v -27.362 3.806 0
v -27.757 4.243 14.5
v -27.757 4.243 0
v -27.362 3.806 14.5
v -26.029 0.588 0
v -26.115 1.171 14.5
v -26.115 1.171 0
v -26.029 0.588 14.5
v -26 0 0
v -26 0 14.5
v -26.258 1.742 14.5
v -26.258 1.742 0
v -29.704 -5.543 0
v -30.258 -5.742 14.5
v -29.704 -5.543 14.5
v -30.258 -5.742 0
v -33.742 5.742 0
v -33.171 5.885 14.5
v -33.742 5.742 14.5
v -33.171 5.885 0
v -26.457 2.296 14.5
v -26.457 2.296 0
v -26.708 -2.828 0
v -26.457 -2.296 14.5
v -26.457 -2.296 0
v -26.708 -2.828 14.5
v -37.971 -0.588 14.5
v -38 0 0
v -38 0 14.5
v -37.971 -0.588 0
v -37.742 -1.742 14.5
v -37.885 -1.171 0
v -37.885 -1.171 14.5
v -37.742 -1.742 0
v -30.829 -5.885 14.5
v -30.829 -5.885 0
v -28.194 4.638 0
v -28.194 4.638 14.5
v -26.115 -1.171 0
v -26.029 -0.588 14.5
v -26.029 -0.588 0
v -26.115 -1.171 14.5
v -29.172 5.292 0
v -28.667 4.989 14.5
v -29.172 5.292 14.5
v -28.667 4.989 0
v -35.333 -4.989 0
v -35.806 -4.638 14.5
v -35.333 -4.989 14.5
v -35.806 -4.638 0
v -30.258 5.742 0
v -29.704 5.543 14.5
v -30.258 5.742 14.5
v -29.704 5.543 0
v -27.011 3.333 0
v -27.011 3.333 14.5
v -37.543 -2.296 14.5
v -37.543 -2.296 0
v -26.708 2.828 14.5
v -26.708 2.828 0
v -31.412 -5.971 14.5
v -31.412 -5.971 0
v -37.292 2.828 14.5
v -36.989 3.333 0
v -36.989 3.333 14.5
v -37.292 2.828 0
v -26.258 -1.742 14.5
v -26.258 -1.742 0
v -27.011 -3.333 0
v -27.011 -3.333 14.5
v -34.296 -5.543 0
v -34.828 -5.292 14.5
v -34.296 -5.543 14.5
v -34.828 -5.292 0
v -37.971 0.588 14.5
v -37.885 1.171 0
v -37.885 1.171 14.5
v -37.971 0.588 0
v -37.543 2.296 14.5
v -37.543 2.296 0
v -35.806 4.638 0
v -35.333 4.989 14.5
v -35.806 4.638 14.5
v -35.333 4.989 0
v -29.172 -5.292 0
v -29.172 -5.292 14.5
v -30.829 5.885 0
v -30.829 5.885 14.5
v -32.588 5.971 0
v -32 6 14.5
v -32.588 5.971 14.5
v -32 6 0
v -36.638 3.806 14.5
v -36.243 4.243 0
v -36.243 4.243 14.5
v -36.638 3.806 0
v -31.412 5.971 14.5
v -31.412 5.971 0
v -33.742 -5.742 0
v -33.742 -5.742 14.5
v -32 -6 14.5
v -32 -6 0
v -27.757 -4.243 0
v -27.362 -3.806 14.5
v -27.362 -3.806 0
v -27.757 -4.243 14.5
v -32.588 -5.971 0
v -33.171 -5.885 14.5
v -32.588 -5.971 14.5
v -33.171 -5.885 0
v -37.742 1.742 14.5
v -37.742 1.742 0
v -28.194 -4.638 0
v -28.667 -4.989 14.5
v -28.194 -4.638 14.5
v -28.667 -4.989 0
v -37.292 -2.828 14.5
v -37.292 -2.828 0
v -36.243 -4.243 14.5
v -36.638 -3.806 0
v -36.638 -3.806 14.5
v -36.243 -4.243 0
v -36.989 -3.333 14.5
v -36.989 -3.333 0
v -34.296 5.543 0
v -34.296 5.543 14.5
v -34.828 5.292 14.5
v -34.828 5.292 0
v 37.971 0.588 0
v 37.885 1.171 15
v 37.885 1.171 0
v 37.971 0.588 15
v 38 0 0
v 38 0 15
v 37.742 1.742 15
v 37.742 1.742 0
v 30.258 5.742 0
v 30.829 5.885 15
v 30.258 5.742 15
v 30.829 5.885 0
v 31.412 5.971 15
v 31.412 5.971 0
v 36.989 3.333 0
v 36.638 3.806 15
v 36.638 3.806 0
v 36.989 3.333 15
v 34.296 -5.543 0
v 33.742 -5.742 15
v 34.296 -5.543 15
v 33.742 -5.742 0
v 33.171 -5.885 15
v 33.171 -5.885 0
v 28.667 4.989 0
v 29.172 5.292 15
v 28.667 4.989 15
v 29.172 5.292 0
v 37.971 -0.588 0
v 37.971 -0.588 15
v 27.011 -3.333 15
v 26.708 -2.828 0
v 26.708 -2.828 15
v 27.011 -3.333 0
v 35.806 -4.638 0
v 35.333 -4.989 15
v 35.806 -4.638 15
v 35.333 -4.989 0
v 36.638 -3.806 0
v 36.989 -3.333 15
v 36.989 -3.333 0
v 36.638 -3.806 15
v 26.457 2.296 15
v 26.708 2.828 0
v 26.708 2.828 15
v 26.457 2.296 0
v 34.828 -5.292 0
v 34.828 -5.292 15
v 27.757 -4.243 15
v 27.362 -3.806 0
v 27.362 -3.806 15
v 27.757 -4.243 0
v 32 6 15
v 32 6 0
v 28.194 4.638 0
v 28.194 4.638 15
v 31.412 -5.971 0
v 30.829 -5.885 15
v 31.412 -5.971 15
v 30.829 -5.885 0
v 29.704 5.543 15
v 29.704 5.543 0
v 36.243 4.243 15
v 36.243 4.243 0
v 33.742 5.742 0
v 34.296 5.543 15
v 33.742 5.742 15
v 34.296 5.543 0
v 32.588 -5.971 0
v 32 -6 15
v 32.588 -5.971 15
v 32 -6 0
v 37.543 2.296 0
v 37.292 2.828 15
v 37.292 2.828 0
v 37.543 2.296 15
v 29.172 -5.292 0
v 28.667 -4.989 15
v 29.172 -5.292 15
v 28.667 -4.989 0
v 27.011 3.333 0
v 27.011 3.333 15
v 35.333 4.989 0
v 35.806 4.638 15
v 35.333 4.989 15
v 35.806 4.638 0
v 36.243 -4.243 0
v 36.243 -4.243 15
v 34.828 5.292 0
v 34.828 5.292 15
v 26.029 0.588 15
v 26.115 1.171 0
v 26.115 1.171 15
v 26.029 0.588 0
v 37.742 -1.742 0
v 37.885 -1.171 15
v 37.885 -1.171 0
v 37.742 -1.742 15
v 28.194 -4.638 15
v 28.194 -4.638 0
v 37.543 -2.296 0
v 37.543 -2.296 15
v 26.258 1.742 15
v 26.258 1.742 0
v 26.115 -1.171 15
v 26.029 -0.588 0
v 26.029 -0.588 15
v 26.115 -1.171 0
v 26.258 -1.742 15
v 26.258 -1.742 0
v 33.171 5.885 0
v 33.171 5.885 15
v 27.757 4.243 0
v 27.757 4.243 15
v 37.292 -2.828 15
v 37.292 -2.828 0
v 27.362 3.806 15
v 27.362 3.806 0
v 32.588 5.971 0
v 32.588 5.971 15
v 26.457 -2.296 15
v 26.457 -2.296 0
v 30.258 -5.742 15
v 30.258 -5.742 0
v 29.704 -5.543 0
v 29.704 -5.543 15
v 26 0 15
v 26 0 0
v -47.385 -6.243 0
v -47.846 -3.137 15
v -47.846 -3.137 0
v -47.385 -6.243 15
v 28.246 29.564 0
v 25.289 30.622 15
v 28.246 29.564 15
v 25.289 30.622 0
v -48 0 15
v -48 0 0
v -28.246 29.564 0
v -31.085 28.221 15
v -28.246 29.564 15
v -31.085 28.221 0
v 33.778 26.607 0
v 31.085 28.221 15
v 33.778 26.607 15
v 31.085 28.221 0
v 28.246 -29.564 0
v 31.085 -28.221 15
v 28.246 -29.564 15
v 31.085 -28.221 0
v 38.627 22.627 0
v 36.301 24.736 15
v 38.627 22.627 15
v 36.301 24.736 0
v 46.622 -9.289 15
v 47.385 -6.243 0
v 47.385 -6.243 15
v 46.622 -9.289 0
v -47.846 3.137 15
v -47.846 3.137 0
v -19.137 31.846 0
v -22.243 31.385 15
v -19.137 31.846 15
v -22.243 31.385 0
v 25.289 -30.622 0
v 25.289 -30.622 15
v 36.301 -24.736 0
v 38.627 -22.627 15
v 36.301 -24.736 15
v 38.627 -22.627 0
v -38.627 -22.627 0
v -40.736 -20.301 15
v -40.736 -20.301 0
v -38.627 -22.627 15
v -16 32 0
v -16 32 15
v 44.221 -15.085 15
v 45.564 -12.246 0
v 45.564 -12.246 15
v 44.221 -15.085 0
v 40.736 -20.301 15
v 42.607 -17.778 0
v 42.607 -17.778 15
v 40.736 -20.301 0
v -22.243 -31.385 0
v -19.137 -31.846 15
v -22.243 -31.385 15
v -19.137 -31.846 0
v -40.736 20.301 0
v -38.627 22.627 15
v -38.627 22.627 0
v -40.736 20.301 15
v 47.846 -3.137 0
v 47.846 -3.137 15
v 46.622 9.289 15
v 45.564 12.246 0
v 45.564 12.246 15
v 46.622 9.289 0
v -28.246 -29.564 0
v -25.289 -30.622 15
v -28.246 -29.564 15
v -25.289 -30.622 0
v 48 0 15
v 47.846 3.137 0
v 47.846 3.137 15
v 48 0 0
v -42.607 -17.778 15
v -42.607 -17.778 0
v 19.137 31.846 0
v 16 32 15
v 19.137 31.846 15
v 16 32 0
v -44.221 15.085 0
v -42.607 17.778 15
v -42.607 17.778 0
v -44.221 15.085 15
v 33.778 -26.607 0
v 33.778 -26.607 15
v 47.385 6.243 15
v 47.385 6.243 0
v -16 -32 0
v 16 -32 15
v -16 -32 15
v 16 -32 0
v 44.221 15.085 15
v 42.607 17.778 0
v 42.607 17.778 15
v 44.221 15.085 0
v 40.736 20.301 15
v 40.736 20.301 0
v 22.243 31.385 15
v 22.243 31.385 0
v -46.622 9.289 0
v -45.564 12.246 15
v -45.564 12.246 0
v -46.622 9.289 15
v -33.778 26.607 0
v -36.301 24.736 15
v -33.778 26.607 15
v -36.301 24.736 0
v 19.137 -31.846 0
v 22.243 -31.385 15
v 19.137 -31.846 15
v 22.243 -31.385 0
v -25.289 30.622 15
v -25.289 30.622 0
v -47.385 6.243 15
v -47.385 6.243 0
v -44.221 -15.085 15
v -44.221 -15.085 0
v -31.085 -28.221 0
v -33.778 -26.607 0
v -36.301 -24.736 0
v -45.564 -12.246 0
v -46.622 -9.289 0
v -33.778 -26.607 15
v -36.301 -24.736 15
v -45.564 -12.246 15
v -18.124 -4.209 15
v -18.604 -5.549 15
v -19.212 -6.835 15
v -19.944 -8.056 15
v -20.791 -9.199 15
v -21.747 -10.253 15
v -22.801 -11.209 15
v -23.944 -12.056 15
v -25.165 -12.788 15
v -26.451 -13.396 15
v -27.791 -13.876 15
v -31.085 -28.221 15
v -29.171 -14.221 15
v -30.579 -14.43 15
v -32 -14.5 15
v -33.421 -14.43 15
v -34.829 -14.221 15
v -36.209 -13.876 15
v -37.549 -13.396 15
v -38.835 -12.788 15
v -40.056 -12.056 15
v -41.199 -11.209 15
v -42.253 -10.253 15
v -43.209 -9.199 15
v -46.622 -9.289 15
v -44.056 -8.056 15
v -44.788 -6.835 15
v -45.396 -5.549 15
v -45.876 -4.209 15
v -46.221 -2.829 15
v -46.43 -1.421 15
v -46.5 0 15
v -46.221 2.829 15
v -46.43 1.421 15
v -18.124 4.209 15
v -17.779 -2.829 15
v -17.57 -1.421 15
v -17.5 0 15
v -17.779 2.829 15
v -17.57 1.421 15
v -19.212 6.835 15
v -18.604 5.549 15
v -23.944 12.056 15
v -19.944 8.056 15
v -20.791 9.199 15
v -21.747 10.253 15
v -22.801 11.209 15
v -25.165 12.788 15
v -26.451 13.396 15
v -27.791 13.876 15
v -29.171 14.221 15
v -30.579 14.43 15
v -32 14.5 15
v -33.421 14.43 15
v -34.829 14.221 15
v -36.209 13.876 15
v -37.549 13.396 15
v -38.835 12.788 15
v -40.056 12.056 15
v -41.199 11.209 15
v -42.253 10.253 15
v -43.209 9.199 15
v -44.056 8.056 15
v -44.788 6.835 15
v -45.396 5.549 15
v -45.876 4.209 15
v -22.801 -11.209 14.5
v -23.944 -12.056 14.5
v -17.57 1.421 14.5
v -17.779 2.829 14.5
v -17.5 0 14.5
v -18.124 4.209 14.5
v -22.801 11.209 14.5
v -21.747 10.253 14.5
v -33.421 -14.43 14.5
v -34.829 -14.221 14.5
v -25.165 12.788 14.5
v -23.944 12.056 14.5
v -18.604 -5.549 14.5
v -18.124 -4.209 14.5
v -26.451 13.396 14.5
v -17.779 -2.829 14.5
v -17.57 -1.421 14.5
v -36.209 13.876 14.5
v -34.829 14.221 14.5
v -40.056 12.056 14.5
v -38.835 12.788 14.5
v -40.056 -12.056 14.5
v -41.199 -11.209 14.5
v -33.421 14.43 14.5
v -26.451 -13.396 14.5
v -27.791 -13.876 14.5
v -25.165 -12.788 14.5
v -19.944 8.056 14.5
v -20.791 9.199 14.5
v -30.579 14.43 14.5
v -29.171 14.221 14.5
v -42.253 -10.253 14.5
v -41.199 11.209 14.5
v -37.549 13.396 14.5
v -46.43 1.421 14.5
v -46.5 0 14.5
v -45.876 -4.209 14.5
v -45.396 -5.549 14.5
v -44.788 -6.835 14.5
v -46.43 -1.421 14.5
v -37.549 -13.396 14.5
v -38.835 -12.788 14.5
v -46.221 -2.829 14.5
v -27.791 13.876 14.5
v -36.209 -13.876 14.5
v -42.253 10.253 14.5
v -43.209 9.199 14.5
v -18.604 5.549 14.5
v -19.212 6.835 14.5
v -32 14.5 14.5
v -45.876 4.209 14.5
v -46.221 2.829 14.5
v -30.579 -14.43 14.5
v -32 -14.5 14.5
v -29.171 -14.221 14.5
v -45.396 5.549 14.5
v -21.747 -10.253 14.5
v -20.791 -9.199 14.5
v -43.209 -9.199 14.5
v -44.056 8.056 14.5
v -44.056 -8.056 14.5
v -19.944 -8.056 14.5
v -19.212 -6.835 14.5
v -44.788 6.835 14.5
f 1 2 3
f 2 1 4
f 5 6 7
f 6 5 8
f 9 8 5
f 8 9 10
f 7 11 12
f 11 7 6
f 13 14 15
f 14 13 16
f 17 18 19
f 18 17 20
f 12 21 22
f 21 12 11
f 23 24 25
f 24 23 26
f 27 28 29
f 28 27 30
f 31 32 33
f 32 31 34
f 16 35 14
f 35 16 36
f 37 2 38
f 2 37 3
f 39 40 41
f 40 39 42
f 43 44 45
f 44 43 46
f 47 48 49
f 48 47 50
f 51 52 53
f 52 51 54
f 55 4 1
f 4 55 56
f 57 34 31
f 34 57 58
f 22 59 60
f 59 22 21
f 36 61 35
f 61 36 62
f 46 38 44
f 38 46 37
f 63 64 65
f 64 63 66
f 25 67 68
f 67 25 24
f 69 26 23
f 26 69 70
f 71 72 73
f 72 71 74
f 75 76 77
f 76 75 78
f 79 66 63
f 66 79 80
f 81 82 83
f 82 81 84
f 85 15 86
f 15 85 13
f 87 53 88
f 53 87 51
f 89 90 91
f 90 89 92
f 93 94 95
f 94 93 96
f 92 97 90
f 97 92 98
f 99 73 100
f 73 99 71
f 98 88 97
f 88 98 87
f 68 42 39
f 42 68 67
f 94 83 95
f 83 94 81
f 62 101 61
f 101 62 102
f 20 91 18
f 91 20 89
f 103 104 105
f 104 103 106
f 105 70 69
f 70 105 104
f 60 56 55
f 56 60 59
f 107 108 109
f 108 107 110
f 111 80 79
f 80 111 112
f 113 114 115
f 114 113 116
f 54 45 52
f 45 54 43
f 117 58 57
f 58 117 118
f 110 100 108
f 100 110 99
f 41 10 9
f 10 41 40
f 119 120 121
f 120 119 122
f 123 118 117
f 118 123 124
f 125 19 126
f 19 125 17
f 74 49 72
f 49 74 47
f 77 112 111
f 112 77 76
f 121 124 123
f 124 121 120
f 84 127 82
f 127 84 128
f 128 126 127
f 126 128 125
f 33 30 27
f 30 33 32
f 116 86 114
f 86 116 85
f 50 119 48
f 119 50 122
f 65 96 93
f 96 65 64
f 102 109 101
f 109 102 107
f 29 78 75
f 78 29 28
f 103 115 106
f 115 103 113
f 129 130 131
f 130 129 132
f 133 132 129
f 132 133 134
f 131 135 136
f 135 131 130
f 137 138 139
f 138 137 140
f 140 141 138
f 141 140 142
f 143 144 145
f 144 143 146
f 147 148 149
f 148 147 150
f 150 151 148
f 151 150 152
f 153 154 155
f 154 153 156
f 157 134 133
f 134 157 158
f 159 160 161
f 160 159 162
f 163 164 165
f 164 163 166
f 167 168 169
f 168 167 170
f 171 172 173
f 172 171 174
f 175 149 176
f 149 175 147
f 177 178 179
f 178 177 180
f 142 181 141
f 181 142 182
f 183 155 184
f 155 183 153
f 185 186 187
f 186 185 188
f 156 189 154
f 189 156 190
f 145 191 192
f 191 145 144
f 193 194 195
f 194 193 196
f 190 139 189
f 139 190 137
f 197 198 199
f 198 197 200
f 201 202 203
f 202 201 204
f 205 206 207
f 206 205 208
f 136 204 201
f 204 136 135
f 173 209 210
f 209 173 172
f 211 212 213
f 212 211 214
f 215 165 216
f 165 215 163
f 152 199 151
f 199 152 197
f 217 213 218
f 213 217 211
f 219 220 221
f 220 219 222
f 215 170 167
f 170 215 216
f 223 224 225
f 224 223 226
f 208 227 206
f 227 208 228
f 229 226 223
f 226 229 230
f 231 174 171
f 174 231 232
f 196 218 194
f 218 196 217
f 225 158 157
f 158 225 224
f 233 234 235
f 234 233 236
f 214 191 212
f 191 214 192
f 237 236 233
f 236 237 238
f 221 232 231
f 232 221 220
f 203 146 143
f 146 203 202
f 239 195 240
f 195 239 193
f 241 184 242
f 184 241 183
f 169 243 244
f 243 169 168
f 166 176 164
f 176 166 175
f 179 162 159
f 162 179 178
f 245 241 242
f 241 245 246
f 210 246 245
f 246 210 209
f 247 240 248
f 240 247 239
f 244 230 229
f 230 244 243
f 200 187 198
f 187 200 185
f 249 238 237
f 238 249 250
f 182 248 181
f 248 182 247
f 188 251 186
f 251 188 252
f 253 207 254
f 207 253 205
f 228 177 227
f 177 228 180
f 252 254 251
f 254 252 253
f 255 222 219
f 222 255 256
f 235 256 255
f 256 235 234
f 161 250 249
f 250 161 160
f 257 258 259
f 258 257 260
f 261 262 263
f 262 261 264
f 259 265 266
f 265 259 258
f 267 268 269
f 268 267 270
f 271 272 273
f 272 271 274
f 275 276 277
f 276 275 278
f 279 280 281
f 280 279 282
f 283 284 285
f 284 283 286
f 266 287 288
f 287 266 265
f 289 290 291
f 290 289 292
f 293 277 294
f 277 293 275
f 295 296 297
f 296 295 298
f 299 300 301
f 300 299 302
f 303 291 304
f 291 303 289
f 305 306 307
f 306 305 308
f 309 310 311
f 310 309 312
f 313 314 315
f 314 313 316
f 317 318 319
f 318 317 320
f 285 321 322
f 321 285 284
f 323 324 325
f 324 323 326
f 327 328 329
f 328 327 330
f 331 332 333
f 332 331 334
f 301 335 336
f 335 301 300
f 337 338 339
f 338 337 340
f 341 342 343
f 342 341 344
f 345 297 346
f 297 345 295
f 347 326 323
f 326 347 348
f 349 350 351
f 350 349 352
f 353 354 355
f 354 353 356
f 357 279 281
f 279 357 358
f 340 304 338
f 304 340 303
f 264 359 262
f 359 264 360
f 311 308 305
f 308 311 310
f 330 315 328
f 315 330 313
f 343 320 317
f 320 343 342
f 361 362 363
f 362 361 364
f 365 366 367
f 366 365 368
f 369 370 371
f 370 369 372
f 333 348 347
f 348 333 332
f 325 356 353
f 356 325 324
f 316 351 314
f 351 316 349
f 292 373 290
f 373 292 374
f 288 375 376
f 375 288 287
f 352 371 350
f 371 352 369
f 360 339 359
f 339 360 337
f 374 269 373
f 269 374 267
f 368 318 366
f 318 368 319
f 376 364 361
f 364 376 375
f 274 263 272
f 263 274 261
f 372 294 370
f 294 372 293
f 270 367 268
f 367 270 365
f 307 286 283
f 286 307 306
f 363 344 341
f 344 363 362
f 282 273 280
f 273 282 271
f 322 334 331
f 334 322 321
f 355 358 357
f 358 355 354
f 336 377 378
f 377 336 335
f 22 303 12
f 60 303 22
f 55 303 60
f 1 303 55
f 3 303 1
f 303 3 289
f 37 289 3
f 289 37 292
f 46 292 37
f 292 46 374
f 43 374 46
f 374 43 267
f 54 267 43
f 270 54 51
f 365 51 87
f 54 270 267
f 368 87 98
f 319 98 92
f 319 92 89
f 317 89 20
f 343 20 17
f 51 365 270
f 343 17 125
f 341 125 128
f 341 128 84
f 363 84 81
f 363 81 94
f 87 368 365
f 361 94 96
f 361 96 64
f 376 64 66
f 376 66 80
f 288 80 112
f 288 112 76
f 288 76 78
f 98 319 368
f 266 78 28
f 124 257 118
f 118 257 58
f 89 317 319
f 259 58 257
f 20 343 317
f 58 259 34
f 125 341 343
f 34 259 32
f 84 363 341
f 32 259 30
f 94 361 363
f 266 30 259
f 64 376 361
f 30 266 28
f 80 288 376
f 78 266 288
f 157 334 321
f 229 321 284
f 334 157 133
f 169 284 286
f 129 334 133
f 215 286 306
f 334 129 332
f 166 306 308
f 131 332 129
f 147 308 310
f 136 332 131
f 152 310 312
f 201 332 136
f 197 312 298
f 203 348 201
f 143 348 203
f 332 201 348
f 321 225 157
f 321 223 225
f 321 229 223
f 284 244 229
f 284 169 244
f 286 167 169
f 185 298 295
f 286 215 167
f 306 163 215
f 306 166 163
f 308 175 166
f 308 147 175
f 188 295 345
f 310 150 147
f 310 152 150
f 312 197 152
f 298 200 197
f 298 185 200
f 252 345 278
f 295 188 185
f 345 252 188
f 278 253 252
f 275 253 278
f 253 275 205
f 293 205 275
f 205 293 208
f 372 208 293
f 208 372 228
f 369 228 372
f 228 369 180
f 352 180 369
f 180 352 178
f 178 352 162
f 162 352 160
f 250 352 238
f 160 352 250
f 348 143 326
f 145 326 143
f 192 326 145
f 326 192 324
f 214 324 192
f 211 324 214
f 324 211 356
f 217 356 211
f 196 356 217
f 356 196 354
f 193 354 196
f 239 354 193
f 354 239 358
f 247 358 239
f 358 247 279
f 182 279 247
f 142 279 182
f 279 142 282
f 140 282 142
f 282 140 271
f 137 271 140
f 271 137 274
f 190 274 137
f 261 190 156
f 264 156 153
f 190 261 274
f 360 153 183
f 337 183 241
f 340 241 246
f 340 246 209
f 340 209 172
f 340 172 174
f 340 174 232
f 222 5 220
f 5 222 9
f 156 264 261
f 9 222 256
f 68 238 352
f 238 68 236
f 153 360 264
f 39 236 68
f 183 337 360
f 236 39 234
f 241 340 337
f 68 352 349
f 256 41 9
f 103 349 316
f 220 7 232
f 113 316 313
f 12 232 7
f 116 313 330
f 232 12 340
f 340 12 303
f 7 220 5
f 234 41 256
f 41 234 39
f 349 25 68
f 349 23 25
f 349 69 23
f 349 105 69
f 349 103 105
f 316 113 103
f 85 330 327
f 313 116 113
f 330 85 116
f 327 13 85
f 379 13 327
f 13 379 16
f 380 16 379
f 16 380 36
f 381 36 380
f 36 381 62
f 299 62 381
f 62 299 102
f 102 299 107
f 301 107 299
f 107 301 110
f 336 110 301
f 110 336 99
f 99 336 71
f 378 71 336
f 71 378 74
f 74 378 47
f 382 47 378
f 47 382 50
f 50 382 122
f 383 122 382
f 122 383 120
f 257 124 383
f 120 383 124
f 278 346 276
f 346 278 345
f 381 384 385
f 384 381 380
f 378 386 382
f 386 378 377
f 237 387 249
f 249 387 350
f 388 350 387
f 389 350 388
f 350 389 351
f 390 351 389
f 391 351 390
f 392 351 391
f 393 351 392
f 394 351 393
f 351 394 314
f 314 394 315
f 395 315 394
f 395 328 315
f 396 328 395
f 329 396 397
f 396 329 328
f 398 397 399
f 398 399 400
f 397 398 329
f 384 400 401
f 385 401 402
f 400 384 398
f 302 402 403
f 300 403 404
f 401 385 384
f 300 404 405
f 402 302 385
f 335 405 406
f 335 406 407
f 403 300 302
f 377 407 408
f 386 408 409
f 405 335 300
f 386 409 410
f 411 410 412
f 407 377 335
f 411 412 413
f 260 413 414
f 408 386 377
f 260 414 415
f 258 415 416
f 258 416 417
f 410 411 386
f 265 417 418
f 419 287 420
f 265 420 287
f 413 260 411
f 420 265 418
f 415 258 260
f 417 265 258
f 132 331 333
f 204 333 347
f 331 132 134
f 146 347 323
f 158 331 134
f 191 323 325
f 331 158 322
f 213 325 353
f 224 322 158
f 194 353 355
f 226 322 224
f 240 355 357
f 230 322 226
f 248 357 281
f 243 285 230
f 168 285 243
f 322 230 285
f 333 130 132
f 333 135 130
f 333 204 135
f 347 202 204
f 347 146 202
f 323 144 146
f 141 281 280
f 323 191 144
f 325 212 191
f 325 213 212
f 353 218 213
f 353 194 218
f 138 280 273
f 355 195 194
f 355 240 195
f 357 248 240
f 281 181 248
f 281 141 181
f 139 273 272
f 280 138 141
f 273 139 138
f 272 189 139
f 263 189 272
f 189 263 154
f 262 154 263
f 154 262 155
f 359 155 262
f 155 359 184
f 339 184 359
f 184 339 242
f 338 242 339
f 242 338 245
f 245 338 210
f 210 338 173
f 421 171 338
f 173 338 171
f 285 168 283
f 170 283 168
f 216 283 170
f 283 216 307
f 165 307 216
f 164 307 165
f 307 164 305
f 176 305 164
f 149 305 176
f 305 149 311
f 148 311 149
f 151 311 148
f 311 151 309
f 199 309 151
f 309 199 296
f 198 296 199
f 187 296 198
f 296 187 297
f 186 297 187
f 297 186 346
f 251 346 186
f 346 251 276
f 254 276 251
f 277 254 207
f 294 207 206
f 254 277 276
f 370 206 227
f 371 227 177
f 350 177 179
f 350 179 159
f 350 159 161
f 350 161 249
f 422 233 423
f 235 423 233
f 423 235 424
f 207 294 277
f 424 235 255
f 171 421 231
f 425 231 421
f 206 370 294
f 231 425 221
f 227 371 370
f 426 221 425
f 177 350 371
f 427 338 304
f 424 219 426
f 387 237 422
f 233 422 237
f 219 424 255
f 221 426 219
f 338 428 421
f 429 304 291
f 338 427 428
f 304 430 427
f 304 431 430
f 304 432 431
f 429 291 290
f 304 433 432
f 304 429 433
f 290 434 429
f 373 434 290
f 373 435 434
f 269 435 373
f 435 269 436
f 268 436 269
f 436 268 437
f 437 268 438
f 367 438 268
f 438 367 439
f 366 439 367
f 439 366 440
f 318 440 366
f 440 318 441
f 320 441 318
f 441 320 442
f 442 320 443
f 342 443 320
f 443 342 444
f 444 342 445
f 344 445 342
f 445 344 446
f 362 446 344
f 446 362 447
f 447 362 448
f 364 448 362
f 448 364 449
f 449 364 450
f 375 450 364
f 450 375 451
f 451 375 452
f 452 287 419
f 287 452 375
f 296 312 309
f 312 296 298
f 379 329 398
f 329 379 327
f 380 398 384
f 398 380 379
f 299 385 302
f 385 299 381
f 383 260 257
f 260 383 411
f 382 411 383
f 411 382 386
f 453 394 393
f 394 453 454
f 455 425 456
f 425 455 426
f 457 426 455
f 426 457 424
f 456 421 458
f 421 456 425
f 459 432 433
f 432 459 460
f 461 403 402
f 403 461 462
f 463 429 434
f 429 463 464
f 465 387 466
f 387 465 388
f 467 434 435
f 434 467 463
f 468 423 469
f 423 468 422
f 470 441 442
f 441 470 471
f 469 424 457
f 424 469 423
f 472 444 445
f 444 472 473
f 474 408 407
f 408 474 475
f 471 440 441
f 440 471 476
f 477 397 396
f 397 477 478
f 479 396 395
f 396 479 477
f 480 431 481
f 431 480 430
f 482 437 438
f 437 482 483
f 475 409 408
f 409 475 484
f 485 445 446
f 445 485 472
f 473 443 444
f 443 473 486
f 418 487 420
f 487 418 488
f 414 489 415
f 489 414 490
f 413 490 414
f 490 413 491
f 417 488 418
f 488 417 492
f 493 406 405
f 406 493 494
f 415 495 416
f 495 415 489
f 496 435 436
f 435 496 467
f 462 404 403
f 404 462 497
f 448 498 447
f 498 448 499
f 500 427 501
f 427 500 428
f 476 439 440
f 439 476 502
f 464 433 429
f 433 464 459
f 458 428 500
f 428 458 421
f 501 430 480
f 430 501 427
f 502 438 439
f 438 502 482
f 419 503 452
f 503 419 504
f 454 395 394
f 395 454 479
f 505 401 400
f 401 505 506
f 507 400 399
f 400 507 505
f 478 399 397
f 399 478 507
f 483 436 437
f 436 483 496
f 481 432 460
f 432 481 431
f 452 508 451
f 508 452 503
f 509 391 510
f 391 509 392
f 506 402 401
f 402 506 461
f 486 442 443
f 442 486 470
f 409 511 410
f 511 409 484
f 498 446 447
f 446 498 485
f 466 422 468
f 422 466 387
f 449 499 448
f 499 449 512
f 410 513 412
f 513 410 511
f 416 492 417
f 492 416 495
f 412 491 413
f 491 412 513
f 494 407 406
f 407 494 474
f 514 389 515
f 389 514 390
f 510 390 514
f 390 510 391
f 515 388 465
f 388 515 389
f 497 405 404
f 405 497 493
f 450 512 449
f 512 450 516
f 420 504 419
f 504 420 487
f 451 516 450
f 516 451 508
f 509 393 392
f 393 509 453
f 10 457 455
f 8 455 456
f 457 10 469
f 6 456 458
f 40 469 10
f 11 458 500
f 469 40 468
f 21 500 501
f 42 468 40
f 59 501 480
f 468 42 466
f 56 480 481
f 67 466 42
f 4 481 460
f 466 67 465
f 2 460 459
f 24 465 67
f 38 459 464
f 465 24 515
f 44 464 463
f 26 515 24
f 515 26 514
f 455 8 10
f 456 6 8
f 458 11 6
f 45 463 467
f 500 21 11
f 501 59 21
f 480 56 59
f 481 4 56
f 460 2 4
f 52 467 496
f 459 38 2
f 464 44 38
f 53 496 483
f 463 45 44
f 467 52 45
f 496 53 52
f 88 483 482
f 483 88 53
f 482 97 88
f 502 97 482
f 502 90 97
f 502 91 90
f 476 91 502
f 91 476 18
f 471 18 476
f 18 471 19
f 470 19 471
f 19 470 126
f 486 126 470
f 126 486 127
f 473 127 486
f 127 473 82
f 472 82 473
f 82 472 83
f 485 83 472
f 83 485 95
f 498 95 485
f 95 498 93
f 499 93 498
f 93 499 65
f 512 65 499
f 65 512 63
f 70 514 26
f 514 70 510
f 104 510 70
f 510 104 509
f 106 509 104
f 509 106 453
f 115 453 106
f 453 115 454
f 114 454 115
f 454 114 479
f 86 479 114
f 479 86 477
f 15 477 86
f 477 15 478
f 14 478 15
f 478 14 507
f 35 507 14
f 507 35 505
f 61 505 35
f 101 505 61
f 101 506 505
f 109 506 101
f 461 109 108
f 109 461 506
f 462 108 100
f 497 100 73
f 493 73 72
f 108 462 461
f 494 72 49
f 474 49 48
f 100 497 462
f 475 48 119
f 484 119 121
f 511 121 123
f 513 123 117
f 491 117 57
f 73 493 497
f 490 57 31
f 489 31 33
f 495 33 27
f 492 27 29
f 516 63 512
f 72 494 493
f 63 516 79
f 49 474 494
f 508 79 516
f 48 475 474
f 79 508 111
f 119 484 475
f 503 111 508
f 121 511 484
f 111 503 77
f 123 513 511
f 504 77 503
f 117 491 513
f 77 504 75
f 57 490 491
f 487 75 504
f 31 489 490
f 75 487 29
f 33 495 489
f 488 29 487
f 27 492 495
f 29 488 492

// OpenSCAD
// FS-OVAL front support two-hole isolator pad
// J40 rubber recreation 3D model, units: millimetres.
// Generated by tools/generate_rubber_recreation_3d_models.py.
// OpenSCAD is the source model; export STL only after release parameters are set.

$fn = 64;

module rounded_rect_2d(size, r) {
  hull() {
    translate([-(size[0] / 2 - r), -(size[1] / 2 - r)]) circle(r = r);
    translate([ (size[0] / 2 - r), -(size[1] / 2 - r)]) circle(r = r);
    translate([ (size[0] / 2 - r),  (size[1] / 2 - r)]) circle(r = r);
    translate([-(size[0] / 2 - r),  (size[1] / 2 - r)]) circle(r = r);
  }
}

module capsule_2d(length, width) {
  hull() {
    translate([-(length - width) / 2, 0]) circle(d = width);
    translate([ (length - width) / 2, 0]) circle(d = width);
  }
}

// Current order basis:
// - Overall capsule 96 x 64 x 15.
// - Two 12 mm holes on 64 mm centres.
// - relief_depth is a model option because the old part must prove whether the
//   rectangular relief is functional, blind, through-cut, or only washer imprint.

module fs_oval_front_support_pad(
  length = 96,
  width = 64,
  thickness = 15,
  hole_d = 12,
  hole_spacing = 64,
  relief_size = [36, 18],
  relief_r = 3,
  relief_depth = 0,
  insert_mark_d = 29,
  insert_mark_depth = 0.5
) {
  difference() {
    linear_extrude(height = thickness, center = false)
      capsule_2d(length, width);

    for (x = [-hole_spacing / 2, hole_spacing / 2])
      translate([x, 0, -1])
        cylinder(h = thickness + 2, d = hole_d);

    if (relief_depth > 0)
      translate([0, 0, thickness - relief_depth])
        linear_extrude(height = relief_depth + 0.2, center = false)
          rounded_rect_2d(relief_size, relief_r);

    if (insert_mark_depth > 0)
      translate([-hole_spacing / 2, 0, thickness - insert_mark_depth])
        cylinder(h = insert_mark_depth + 0.2, d = insert_mark_d);
  }
}

fs_oval_front_support_pad();
